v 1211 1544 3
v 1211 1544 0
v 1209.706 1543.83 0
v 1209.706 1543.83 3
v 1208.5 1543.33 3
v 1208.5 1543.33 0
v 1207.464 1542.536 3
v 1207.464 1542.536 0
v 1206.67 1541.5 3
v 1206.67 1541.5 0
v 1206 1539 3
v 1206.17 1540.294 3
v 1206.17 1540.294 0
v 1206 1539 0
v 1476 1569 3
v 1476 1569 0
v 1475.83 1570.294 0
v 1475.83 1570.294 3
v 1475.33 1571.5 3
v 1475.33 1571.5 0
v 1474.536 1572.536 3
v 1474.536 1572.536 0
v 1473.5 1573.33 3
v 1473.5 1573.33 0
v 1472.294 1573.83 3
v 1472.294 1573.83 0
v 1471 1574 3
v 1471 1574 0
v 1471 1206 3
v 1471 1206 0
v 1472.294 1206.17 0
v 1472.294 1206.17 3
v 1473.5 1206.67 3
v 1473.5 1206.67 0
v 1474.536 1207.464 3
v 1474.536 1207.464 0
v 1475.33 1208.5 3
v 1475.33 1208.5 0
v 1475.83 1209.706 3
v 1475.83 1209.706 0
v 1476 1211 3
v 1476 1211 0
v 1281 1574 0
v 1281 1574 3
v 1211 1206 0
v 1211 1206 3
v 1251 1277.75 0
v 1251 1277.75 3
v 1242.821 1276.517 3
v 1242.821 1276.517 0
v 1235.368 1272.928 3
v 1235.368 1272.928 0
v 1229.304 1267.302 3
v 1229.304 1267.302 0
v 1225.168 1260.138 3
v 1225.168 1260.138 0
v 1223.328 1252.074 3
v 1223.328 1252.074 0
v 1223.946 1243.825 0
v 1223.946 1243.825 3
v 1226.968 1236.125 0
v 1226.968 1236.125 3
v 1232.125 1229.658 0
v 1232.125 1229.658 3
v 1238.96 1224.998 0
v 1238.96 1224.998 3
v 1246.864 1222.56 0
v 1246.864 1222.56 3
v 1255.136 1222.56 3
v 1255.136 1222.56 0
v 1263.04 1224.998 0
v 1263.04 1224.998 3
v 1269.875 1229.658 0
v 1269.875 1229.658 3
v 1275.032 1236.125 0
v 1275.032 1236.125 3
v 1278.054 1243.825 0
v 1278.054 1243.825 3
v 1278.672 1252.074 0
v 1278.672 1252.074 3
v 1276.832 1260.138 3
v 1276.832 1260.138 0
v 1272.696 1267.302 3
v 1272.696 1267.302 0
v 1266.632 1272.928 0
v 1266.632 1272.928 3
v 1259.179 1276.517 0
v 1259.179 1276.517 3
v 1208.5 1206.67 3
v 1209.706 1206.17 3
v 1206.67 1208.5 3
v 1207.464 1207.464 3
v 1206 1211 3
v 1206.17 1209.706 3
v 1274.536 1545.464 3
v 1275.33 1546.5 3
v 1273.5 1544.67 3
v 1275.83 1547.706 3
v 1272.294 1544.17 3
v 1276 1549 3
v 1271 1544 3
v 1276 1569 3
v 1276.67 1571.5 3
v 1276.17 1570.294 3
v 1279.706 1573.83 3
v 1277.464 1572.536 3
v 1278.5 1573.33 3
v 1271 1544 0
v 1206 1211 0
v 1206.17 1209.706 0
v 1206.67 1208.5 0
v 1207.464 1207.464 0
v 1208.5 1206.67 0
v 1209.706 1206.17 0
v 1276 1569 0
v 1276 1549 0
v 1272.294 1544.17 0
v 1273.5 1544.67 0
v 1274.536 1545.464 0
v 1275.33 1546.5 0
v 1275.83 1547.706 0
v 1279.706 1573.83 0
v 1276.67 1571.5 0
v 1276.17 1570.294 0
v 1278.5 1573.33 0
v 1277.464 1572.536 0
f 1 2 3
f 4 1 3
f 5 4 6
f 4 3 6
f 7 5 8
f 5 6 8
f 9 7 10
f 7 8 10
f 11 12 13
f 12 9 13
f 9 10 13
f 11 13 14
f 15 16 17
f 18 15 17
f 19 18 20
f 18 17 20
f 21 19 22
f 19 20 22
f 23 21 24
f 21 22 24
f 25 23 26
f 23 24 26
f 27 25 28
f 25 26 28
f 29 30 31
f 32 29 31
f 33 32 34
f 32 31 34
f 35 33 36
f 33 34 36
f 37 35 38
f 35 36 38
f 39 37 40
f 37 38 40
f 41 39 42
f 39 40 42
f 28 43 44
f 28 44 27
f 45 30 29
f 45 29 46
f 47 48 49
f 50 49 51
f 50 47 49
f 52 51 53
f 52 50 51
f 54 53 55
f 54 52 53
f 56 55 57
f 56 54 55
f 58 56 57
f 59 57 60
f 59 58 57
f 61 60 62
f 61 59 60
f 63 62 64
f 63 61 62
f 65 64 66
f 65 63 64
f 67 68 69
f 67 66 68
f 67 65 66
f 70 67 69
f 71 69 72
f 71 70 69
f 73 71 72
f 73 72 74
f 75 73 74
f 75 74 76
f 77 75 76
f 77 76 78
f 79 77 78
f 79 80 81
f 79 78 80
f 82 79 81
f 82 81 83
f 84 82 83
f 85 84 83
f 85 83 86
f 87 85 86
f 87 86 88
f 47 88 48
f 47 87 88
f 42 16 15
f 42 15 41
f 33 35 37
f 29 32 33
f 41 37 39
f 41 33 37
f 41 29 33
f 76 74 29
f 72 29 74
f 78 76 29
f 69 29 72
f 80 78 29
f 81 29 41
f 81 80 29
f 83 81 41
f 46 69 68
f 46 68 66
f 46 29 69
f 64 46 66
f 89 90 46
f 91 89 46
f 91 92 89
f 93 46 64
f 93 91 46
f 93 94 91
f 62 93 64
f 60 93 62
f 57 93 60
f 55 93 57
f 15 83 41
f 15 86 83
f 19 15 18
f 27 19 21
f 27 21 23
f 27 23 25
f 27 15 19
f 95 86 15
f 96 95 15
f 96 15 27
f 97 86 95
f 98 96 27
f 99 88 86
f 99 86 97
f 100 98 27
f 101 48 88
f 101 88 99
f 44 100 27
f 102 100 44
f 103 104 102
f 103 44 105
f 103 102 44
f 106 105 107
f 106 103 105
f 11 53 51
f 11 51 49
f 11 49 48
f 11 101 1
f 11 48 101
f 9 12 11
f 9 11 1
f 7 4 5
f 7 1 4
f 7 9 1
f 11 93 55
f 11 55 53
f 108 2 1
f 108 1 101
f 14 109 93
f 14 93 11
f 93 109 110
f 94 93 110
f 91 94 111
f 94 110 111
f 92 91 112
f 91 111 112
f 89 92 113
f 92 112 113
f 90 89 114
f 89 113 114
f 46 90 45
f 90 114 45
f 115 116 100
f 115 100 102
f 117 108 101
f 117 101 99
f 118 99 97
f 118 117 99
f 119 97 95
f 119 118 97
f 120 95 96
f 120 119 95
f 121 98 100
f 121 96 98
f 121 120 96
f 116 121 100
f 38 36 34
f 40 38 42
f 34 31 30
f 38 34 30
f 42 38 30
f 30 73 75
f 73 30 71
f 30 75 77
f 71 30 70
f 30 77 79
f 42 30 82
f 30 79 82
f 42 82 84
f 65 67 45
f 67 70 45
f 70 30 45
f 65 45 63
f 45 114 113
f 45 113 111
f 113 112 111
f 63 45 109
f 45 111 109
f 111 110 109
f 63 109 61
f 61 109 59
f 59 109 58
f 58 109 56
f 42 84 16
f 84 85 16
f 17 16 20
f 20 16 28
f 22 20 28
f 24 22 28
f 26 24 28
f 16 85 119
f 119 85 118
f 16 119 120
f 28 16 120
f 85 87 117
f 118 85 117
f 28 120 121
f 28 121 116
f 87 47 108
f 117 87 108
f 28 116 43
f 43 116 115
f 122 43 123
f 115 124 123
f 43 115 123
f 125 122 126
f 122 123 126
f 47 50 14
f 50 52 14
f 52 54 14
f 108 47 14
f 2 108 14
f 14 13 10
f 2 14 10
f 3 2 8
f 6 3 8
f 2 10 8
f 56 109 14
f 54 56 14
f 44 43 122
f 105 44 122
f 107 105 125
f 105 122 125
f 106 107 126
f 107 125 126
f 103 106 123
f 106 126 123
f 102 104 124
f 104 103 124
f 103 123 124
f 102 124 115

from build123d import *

# Parameters (mm, degrees)
PAD012_DEPTH            = 3
SKETCH090_R             = 27.75
POCKET039_DEPTH         = 0.001
POCKET039_DEPTH_BACK    = 3.001
POCKET040_DEPTH         = 0.001
POCKET040_DEPTH_BACK    = 3.001
BODY081_PLACEMENT_ANGLE = 90


with BuildPart() as part:
    # Sketch089 → Pad012 (new body)
    with BuildSketch(Plane.XY):
        with BuildLine():
            ThreePointArc((-184, -130), (-182.535534, -133.535534), (-179, -135))
            Line((179, -135), (-179, -135))
            ThreePointArc((179, -135), (182.535534, -133.535534), (184, -130))
            Line((184, 130), (184, -130))
            ThreePointArc((184, 130), (182.535534, 133.535534), (179, 135))
            Line((-179, 135), (179, 135))
            ThreePointArc((-179, 135), (-182.535534, 133.535534), (-184, 130))
            Line((-184, -130), (-184, 130))
        make_face()
    extrude(amount=PAD012_DEPTH)

    # Sketch090 → Pocket039 (cut, two sides)
    with BuildSketch(Plane(origin=(-140, 90, 0), x_dir=(1, 0, 0), z_dir=(0, 0, 1))) as pocket039_sk:
        Circle(SKETCH090_R)
    extrude(amount=-POCKET039_DEPTH, mode=Mode.SUBTRACT)
    extrude(pocket039_sk.sketch, amount=POCKET039_DEPTH_BACK, mode=Mode.SUBTRACT)

    # Sketch091 → Pocket040 (cut, two sides)
    with BuildSketch(Plane.XY) as pocket040_sk:
        with BuildLine():
            Line((184, 135), (149, 135))
            ThreePointArc((154, 130), (152.535534, 133.535534), (149, 135))
            Line((154, 130), (154, 70))
            ThreePointArc((154, 70), (155.464466, 66.464466), (159, 65))
            Line((159, 65), (179, 65))
            ThreePointArc((184, 60), (182.535534, 63.535534), (179, 65))
            Line((184, 60), (184, 135))
        make_face()
    extrude(amount=-POCKET040_DEPTH, mode=Mode.SUBTRACT)
    extrude(pocket040_sk.sketch, amount=POCKET040_DEPTH_BACK, mode=Mode.SUBTRACT)


with BuildPart() as part_1:
    # Body081 placement: moved
    add(part.part.moved(Location((1341, 1390, 0))).rotate(Axis((1341, 1390, 0), (0, 0, 1)), BODY081_PLACEMENT_ANGLE))


solid = part_1.part
